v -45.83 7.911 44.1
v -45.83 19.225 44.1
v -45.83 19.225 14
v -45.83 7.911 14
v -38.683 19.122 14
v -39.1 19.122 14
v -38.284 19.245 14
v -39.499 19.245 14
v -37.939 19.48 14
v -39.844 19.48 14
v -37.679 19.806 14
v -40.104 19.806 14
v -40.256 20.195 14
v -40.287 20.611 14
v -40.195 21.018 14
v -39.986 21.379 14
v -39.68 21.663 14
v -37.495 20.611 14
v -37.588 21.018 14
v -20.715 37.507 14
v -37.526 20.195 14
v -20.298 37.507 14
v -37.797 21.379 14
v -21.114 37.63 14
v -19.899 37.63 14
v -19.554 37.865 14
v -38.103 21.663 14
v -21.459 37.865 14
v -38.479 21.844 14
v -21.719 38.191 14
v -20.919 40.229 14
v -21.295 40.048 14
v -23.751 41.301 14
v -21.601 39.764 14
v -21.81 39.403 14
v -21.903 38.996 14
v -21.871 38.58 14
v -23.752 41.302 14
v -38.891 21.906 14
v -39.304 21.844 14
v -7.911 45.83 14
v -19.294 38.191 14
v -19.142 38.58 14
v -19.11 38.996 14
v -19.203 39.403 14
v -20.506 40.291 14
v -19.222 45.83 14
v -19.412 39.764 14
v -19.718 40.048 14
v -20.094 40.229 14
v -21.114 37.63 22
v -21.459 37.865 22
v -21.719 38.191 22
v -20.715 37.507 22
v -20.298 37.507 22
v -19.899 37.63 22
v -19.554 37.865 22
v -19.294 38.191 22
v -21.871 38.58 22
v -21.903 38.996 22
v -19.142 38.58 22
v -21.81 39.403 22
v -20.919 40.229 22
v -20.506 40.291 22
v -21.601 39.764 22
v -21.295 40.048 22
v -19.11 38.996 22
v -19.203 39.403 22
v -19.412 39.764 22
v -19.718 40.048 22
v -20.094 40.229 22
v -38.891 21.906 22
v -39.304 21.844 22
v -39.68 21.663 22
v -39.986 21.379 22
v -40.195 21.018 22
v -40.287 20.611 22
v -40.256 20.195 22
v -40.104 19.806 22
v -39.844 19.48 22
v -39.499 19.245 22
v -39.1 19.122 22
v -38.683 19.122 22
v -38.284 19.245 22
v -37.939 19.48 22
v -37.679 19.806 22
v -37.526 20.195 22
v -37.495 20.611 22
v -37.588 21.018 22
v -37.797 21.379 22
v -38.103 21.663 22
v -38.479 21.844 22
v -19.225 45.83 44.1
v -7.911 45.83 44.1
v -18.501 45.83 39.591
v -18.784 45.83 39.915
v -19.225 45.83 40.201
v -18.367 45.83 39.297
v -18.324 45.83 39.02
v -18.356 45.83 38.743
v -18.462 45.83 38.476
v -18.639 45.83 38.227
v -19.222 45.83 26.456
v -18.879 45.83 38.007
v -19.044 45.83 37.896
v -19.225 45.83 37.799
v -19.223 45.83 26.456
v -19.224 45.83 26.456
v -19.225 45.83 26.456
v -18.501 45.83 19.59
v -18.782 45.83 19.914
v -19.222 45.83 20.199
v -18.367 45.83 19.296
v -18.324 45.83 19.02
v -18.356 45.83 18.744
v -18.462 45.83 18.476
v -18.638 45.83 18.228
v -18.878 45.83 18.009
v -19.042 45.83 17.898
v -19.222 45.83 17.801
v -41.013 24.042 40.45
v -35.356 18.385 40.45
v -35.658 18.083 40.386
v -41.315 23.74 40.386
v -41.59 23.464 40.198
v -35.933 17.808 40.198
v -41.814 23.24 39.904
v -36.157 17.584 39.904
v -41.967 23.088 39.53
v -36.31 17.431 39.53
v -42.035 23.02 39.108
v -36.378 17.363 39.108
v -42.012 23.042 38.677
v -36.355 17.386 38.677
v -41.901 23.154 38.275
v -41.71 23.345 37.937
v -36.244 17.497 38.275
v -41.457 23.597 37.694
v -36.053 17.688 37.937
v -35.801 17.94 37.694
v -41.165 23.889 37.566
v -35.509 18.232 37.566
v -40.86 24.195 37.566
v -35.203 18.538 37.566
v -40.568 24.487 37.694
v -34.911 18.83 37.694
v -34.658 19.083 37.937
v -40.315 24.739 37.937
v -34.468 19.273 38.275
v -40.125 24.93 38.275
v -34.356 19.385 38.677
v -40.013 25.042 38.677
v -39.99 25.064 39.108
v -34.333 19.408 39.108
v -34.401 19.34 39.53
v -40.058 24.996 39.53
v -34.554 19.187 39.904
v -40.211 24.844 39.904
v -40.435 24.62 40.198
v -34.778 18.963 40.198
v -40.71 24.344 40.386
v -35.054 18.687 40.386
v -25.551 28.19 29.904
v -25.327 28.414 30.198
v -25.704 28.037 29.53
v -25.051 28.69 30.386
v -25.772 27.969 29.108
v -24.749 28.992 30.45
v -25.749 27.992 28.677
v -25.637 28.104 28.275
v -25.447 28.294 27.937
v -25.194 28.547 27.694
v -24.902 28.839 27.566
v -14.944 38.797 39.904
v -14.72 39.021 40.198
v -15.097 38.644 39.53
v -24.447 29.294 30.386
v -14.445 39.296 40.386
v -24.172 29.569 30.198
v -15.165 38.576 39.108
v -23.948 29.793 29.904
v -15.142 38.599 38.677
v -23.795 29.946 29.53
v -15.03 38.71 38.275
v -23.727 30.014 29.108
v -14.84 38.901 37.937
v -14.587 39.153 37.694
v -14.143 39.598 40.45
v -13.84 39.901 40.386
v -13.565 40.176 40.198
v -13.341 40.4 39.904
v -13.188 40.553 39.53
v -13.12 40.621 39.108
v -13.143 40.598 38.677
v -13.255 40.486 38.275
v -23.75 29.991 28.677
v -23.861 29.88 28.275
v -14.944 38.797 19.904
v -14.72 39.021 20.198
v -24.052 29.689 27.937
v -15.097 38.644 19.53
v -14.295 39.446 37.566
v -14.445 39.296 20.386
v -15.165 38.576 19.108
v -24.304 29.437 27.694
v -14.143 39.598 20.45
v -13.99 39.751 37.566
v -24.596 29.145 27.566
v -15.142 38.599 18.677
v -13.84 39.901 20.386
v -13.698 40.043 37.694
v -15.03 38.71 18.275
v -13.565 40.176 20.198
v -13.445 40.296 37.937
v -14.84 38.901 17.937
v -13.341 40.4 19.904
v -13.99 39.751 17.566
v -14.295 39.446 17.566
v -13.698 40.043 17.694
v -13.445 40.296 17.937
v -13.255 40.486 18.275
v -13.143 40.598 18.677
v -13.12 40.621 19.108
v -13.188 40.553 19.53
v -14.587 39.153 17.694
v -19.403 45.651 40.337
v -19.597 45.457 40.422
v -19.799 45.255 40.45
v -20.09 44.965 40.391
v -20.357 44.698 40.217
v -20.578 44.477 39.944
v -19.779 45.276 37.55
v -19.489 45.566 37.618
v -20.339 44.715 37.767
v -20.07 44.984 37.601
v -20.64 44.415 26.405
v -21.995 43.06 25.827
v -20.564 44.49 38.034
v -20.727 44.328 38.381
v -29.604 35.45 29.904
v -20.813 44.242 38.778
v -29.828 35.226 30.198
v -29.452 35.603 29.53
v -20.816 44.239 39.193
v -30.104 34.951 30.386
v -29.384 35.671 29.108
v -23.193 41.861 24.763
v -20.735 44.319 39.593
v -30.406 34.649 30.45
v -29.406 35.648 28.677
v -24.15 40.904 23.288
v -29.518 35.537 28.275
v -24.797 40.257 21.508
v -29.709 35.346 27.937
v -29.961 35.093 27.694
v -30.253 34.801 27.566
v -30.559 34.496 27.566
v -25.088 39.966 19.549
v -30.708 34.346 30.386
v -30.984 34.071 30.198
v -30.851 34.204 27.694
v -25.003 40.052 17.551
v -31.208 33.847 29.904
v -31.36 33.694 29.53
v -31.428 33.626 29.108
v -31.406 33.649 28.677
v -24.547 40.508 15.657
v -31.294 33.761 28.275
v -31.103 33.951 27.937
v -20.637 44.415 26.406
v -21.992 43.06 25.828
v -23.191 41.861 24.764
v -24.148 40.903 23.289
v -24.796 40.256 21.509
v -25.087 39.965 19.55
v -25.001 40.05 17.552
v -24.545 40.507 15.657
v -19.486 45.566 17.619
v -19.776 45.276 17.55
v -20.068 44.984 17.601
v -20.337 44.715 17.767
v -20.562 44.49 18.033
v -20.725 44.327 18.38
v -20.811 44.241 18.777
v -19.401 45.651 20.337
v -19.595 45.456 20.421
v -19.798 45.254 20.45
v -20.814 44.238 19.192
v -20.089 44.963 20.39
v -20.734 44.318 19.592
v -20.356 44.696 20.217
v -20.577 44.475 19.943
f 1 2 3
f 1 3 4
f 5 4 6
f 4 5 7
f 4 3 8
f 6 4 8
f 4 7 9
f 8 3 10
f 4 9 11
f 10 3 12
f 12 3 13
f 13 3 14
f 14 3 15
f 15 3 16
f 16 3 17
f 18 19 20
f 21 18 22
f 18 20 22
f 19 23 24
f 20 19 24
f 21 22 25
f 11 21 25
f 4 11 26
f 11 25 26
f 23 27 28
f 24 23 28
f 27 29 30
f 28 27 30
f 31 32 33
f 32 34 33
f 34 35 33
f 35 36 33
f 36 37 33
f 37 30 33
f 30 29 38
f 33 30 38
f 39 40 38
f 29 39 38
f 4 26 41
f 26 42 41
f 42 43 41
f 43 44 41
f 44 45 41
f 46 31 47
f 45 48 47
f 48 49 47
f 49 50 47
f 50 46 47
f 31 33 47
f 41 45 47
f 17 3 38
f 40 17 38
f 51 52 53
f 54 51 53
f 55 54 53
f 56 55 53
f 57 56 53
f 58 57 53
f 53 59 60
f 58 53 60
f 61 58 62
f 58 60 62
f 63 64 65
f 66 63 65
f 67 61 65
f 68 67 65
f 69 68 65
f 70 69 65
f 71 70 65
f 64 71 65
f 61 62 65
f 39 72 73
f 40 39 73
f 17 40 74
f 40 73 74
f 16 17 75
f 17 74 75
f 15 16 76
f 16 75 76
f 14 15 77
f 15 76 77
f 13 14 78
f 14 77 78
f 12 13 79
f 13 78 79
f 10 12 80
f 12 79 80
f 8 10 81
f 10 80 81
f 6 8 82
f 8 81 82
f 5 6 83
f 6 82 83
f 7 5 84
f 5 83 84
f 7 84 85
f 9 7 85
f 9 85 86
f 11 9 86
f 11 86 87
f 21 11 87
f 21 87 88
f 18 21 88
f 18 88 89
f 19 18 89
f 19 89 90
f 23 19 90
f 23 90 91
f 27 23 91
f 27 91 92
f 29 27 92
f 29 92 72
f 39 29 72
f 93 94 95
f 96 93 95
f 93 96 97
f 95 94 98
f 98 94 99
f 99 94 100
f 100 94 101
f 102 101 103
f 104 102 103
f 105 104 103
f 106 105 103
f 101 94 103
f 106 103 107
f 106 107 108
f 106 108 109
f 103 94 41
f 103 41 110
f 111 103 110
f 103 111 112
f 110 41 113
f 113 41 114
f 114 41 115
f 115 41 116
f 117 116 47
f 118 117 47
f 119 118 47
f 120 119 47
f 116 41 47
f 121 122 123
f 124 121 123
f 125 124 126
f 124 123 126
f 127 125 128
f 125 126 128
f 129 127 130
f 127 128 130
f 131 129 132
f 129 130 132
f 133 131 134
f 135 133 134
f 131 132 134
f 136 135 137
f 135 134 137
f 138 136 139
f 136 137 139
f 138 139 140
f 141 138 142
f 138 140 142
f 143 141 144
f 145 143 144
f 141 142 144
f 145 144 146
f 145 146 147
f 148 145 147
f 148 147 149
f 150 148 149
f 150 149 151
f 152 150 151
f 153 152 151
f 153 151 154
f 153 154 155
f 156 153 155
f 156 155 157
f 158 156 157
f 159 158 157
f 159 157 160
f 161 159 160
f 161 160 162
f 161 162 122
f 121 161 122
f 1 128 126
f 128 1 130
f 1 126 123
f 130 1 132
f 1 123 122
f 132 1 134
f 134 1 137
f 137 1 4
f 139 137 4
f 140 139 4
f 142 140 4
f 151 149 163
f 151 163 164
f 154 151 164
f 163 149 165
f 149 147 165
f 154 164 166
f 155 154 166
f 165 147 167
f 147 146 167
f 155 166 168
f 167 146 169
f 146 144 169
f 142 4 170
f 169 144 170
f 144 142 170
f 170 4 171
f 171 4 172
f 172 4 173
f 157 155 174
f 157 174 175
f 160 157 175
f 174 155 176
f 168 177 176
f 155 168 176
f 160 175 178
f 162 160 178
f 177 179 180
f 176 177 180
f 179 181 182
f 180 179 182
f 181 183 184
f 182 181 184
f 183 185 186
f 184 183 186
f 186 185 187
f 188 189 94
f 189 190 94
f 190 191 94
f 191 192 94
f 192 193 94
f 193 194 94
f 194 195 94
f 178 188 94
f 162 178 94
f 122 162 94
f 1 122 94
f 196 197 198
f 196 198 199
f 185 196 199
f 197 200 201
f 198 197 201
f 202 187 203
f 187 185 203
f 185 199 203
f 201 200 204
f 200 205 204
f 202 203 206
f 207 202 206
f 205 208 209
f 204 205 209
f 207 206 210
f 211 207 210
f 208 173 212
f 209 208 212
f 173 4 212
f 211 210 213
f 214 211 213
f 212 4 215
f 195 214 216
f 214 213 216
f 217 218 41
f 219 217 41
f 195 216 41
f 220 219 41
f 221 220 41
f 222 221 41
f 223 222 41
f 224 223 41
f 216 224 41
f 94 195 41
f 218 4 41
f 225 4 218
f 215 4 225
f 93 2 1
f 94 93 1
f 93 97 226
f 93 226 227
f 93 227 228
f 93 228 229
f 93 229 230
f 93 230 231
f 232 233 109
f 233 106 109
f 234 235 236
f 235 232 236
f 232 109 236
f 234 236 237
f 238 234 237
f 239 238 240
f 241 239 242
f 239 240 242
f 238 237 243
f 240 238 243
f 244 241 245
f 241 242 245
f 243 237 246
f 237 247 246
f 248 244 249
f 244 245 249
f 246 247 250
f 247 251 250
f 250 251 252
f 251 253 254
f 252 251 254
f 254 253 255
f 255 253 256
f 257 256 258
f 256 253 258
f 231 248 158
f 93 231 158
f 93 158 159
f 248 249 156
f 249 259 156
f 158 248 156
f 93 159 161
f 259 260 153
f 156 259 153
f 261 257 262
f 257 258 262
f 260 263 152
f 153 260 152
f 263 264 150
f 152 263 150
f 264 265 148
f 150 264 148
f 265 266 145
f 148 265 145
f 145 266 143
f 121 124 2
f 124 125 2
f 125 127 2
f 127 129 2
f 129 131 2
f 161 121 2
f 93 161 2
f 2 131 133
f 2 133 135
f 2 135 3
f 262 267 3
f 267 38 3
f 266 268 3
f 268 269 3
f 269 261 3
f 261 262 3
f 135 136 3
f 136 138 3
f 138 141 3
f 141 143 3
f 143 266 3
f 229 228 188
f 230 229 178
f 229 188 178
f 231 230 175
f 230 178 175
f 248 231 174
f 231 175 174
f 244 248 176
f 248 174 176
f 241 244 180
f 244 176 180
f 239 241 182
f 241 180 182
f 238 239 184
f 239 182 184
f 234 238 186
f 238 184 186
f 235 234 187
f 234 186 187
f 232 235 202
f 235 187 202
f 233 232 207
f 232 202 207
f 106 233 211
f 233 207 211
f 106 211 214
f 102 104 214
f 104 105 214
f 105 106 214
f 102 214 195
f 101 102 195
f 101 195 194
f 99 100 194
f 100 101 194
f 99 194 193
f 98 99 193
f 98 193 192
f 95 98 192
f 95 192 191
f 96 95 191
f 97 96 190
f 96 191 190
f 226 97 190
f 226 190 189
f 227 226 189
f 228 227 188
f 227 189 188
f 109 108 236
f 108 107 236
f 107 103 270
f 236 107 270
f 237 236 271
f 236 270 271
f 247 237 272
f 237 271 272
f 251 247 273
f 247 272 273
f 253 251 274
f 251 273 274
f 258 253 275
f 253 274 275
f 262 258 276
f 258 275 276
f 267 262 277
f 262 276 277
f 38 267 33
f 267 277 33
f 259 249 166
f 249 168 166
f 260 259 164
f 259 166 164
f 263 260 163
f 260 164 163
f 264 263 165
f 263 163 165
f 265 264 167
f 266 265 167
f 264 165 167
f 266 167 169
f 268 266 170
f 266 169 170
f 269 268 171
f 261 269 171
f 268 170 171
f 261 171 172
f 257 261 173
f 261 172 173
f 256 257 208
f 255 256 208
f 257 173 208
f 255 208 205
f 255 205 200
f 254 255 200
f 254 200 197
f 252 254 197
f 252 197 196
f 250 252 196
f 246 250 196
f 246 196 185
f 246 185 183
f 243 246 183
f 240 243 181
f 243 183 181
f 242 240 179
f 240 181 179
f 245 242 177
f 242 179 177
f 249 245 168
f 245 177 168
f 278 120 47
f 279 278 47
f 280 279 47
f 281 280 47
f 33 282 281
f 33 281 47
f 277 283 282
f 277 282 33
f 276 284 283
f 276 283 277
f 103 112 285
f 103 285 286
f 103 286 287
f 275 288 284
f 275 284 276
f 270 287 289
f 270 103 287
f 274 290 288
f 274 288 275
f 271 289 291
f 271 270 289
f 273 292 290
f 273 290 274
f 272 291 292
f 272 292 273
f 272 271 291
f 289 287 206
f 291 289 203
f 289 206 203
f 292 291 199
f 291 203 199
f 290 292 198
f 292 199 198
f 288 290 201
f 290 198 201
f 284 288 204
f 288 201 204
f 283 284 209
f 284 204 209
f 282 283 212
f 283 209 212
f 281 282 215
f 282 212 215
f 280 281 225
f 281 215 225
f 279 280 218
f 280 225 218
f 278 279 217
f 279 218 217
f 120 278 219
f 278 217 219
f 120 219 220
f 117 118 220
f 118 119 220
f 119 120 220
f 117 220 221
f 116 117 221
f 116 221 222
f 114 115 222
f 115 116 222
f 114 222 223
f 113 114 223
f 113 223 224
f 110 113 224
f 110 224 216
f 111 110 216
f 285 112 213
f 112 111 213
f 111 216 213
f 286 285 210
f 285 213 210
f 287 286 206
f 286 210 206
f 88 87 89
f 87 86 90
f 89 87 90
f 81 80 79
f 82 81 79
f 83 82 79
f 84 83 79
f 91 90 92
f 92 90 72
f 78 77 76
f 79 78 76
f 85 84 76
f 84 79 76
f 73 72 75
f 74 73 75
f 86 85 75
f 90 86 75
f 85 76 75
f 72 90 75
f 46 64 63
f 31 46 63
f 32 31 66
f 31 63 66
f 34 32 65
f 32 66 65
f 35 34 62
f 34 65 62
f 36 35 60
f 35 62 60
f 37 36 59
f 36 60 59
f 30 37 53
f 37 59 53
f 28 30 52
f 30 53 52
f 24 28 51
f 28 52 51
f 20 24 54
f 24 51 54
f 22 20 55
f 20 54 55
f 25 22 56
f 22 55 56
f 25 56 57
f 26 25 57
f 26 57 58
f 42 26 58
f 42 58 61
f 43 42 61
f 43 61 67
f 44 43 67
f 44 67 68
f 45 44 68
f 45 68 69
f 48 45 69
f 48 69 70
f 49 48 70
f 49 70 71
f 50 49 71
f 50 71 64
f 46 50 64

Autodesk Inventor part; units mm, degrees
ref_plane "YZ Plane" through (0, 0, 0) normal (1, 0, 0) x (0, 1, 0)
ref_plane "Work Plane1" through (0, 0, 10) normal (0, 0, 1) x (1, 0, 0)
sketch "Sketch1" plane through (0, 0, 10) normal (0, 0, 1) x (1, 0, 0)
  line L0 (-4.0299, -0.3538) -> (-2.2322, 1.4439) construction
  arc A0 (-1.4439, 2.2322) -> (-2.2322, 1.4439) centre (-0.9299, 0.9299) ccw construction
  line L1 (-1.4439, 2.2322) -> (0.3538, 4.0299) construction
  line L2 (-37.8299, 42.8299) -> (-37.8299, 37.8299) construction
  line L3 (-37.8299, 37.8299) -> (-42.9208, 37.8299) construction
  line L4 (-37.8299, 42.2137) -> (-37.8299, 45.8299) construction
  line L5 (-37.8299, 45.8299) -> (-4.0299, 45.8299) construction
  line L6 (-4.0299, 45.8299) -> (-4.0299, 42.2137) construction
  line L7 (-4.0299, 4.0299) -> (0.3538, 4.0299) projected
  circle A1 centre (-20.9299, 20.9299) radius 17.5 projected
  line L8 (-20.9299, 58.9723) -> (17.1124, 20.9299) construction
  line L9 (17.1124, 20.9299) -> (-20.9299, -17.1124) construction
  line L10 (-20.9299, -17.1124) -> (-58.9723, 20.9299) construction
  line L11 (-58.9723, 20.9299) -> (-20.9299, 58.9723) construction
  line L12 (-20.9299, 58.9723) -> (-20.9299, -17.1124) construction
  line L13 (17.1124, 20.9299) -> (-58.9723, 20.9299) construction
  line L14 (-20.9299, 58.9723) -> (32.8701, 58.9723) construction
  line L15 (-43.4299, 43.4299) -> (1.5701, 43.4299) construction
  line L16 (1.5701, 43.4299) -> (1.5701, -1.5701) construction
  line L17 (1.5701, -1.5701) -> (-43.4299, -1.5701) construction
  line L18 (-43.4299, -1.5701) -> (-43.4299, 43.4299) construction
  line L19 (-43.4299, 43.4299) -> (1.5701, -1.5701) construction
  line L20 (1.5701, 43.4299) -> (-43.4299, -1.5701) construction
  line L21 (-43.4299, 5.3876) -> (-43.4299, 36.4723)
  line L22 (-43.4299, 36.4723) -> (-36.4723, 43.4299)
  line L23 (-36.4723, 43.4299) -> (-5.3876, 43.4299)
  line L24 (-5.3876, 43.4299) -> (1.5701, 36.4723)
  line L25 (1.5701, 36.4723) -> (1.5701, 5.3876)
  line L26 (1.5701, 5.3876) -> (-5.3876, -1.5701)
  line L27 (-5.3876, -1.5701) -> (-36.4723, -1.5701)
  line L28 (-36.4723, -1.5701) -> (-43.4299, 5.3876)
  line L29 (-4.0299, 42.2137) -> (-37.8299, 42.2137) projected
  line L30 (-4.0299, -0.3538) -> (-4.0299, 4.0299) projected
  circle A2 centre (-20.9299, 20.9299) radius 1.4
  line L31 (-10.9299, 10.9299) -> (-30.9299, 10.9299) construction
  line L32 (-30.9299, 10.9299) -> (-30.9299, 30.9299) construction
  line L33 (-30.9299, 30.9299) -> (-10.9299, 30.9299) construction
  line L34 (-10.9299, 30.9299) -> (-10.9299, 10.9299) construction
  line L35 (-10.9299, 10.9299) -> (-30.9299, 30.9299) construction
  line L36 (-30.9299, 10.9299) -> (-10.9299, 30.9299) construction
  circle A3 centre (-30.9299, 30.9299) radius 1.4
  circle A4 centre (-30.9299, 10.9299) radius 1.4
  circle A5 centre (-10.9299, 10.9299) radius 1.4
  line L37 (-45.8299, 37.8299) -> (-42.0723, 37.8299) construction
  line L38 (-42.1723, 37.7299) -> (-45.8299, 37.7299)
  line L39 (-45.8299, 37.7299) -> (-45.8299, 4.1299)
  line L40 (-45.8299, 4.1299) -> (-42.1723, 4.1299)
  line L41 (-42.1723, 4.1299) -> (-42.1723, 37.7299)
  line L42 (-45.8299, 4.0299) -> (-42.0723, 4.0299) construction
  line L43 (-45.8299, 37.8299) -> (-42.0723, 37.8299) projected
  line L44 (-37.7299, 45.8299) -> (-4.1299, 45.8299)
  line L45 (-4.1299, 45.8299) -> (-4.1299, 42.1723)
  line L46 (-4.1299, 42.1723) -> (-37.7299, 42.1723)
  line L47 (-37.7299, 42.1723) -> (-37.7299, 45.8299)
  line L48 (0.4701, 37.8299) -> (0.4701, 4.0299) construction
  line L49 (0.4701, 4.0299) -> (3.9701, 4.0299) construction
  line L50 (3.9701, 37.8299) -> (3.9701, 4.0299) construction
  line L51 (0.4701, 37.8299) -> (3.9701, 37.8299) construction
  line L52 (-45.8299, -3.9701) -> (-4.0299, -3.9701) construction
  line L53 (0.3124, 37.7299) -> (3.9701, 37.7299)
  line L54 (3.9701, 37.7299) -> (3.9701, 4.1299)
  line L55 (3.9701, 4.1299) -> (0.3124, 4.1299)
  line L56 (0.3124, 4.1299) -> (0.3124, 37.7299)
  line L57 (-4.1713, -0.3538) -> (-37.7299, -0.3538)
  line L58 (-37.7299, -0.3538) -> (-37.7299, -3.9701)
  line L59 (-37.7299, -3.9701) -> (-4.1713, -3.9701)
  line L60 (-4.1713, -3.9701) -> (-4.1713, -0.3538)
  point P0 (-37.8299, 4.0299)
  dimension "d18" = 53.8
  dimension "d19" = 45
  dimension "d20" = 53.8
  dimension "d21" = 45
  dimension "d22" = 45
  dimension "d30" = 20
  dimension "d31" = 20
  dimension "d32" = 2.8
  dimension "d33" = 2.8
  dimension "d34" = 2.8
  dimension "d35" = 2.8
  dimension "d36" = 0.1
  dimension "d37" = 0.1
  dimension "d38" = 0.1
  dimension "d39" = 0.1
extrude "Extrusion1" add sketch "Sketch1" along normal blind 5 contours L30 L26 L57 L28 L41 L22 L46 L24 L56 L7 | L7 L26 L30 | L56 L24 L25 L26 | L26 L25 L24 L53 L54 L55 | L60 L59 L58 L57 L28 L27 L26 | L26 L27 L28 L57 | L46 L22 L29 L24 | L24 L29 L45 | L40 L39 L38 L22 L21 L28 | L28 L21 L22 L41 | L29 L22 L23 L24 | L24 L23 L22 L29 L47 L44 L45 | L47 L29 L22 | A1 | A2 | A3 | A4 | A5
sketch "Sketch4" plane through (0, 0, 15) normal (0, 0, 1) x (1, 0, 0)
  line L0 (-37.7299, 42.1723) -> (-42.1723, 37.7299) projected
  line L1 (-42.1723, 37.7299) -> (-45.8299, 37.7299) projected
  line L2 (-45.8299, 37.7299) -> (-45.8299, 4.1299) projected
  line L3 (-45.8299, 4.1299) -> (-42.1723, 4.1299) projected
  line L4 (-42.1723, 4.1299) -> (-37.6885, -0.3538) projected
  line L5 (-37.6885, -0.3538) -> (-37.7299, -0.3538) projected
  line L6 (-37.7299, -0.3538) -> (-37.7299, -3.9701) projected
  line L7 (-37.7299, -3.9701) -> (-4.1713, -3.9701) projected
  line L8 (-4.1713, -3.9701) -> (-4.1713, -0.3538) projected
  line L9 (-4.1713, -0.3538) -> (0.3124, 4.1299) projected
  line L10 (0.3124, 4.1299) -> (3.9701, 4.1299) projected
  line L11 (3.9701, 4.1299) -> (3.9701, 37.7299) projected
  line L12 (3.9701, 37.7299) -> (0.3124, 37.7299) projected
  line L13 (0.3124, 37.7299) -> (-4.1299, 42.1723) projected
  line L14 (-4.1299, 42.1723) -> (-4.1299, 45.8299) projected
  line L15 (-4.1299, 45.8299) -> (-37.7299, 45.8299) projected
  line L16 (-37.7299, 45.8299) -> (-37.7299, 42.1723) projected
  line L17 (-45.8299, 37.7299) -> (-45.8299, 4.1299) projected
  line L18 (-45.8299, 7.911) -> (-7.911, 45.8299)
  line L19 (-45.8299, 7.911) -> (7.7955, 7.911) construction
  line L20 (-7.911, 45.8299) -> (-19.2247, 45.8299)
  line L21 (-4.1299, 45.8299) -> (-37.7299, 45.8299) projected
  line L22 (-19.2247, 45.8299) -> (-45.8299, 19.2247)
  line L23 (-45.8299, 7.911) -> (-45.8299, 19.2247)
  circle A0 centre (-40.9299, 0.9299) radius 1.1933 projected
  circle A1 centre (-0.9299, 40.9299) radius 1.4 projected
  line L24 (-40.9299, 0.9299) -> (-0.9299, 40.9299)
  line L25 (0.3124, 37.7299) -> (-4.1299, 42.1723) projected
  point P0 (0, 0)
  dimension "d40" = 45
  dimension "d41" = 8
extrude "Extrusion4" add sketch "Sketch4" along normal blind 28 contours L15 L18 L2 L22
sketch "Sketch5" plane through (-45.8299, 19.2247, 15) normal (-0.7071068, 0.7071068, 0) x (-0.7071068, -0.7071068, 0)
  line L0 (0, 0) -> (-37.6254, 0) projected
  line L1 (0, 0) -> (0, 28) projected
  line L2 (-37.6254, 28) -> (0, 28) projected
  line L3 (-37.6254, 0) -> (-37.6254, 28) projected
  circle A0 centre (-18.8127, 9.1873) radius 18.8127
  line L4 (-6.8127, 24) -> (-36.8127, 24) construction
  line L5 (-36.8127, 24) -> (-36.8127, 4) construction
  line L6 (-36.8127, 4) -> (-6.8127, 4) construction
  line L7 (-6.8127, 4) -> (-6.8127, 24) construction
  line L8 (-6.8127, 24) -> (-36.8127, 4) construction
  line L9 (-36.8127, 24) -> (-6.8127, 4) construction
  point P0 (-18.8127, -15)
  point P1 (-21.8127, 14)
  dimension "d44" = 30
  dimension "d45" = 20
hole "Hole1" at (-19.7994, 45.2552, 39) at (-19.7994, 45.2552, 19) at (-41.0126, 24.042, 39) at (-30.406, 34.6486, 29) direction (0.7071068, -0.7071068, 0) diameter 2.9 depth 12
sketch "Sketch6" plane through (-37.7299, -3.9701, 10) normal (0, -1, 0) x (1, 0, 0)
  circle A0 centre (-3.2, 36.9) radius 1.45 projected
  circle A1 centre (36.8, 36.9) radius 1.45 projected
  line L0 (-6.1, 0) -> (-6.1, 39.8) projected
  line L1 (-0.1, 0) -> (-6.1, 0) projected
  line L2 (-0.1, 33.8) -> (-0.1, 0) projected
  line L3 (33.7, 33.8) -> (-0.1, 33.8) projected
  line L4 (33.7, 33.8) -> (33.7, 0) projected
  line L5 (39.7, 0) -> (33.7, 0) projected
  line L6 (39.7, 39.8) -> (39.7, 0) projected
  line L7 (-6.1, 39.8) -> (39.7, 39.8) projected
  circle A2 centre (16.8, 16.9) radius 16.9
  circle A3 centre (16.8, 16.9) radius 14.9
  line L8 (-0.1, 16.9) -> (-0.1, 0)
  line L9 (0, 0) -> (33.5586, 0) projected
  line L10 (0.0414, 0) -> (-4.4423, 0) projected
  line L11 (33.5586, 0) -> (0.0414, 0)
  line L12 (33.7, 16.9) -> (33.5586, 0)
  point P0 (37.7299, -10)
  dimension "d53" = 2
extrude "Extrusion5" cut sketch "Sketch6" against normal up to surface contours A3 surface through (-45.8299, 7.911, 15) normal (0.7071068, -0.7071068, 0)
ref_plane "Work Plane3" through (3.9701, 45.8299, 26) normal (1, 0, 0) x (0, -1, 0)
sketch "Sketch7" plane through (3.9701, 45.8299, 26) normal (1, 0, 0) x (0, -1, 0)
  line L0 (41.8, -17.8) -> (41.8, 16) projected
  line L1 (8, -17.8) -> (41.8, -17.8) projected
  line L2 (8, -17.8) -> (8, 16) projected
  circle A0 centre (24.9, -0.9) radius 16.9
  circle A1 centre (24.9, -0.9) radius 14.9
  point P0 (45.8299, 26)
  dimension "d56" = 2
ref_plane "Work Plane4" through (-34.8055, 8.3289, 16.6138) normal (0.7071068, -0.7071068, 0) x (0.7071068, 0.7071068, 0)
extrude "Extrusion6" cut sketch "Sketch7" against normal up to surface contours A1 surface through (-45.8299, 7.911, 15) normal (0.7071068, -0.7071068, 0)
sketch "Sketch8" plane through (-45.8299, 19.2247, 15) normal (-0.7071068, 0.7071068, 0) x (-0.7071068, -0.7071068, 0)
  arc A0 (-37.6254, 2.7992) -> (-37.6254, 5.2008) centre (-36.8127, 4) ccw projected
  circle A1 centre (-36.8127, 4) radius 7.5
  point P0 (-18.8127, -15)
  dimension "d59" = 15
extrude "Extrusion7" cut sketch "Sketch8" along normal blind 10
sketch "Sketch9" plane through (0, 0, 10) normal (0, 0, -1) x (-1, 0, 0)
  line L0 (45.8299, 19.2247) -> (24.2855, 40.7692) projected
  line L1 (41.7776, 11.9633) -> (26.8705, 26.8705) projected
  line L2 (26.8705, 26.8705) -> (11.9633, 41.7776) projected
  line L3 (19.2247, 45.8299) -> (24.2855, 40.7692) projected
  line L4 (7.911, 45.8299) -> (11.9633, 41.7776) projected
  line L5 (41.7776, 11.9633) -> (45.8299, 7.911) projected
  line L6 (15.1679, 38.5731) -> (20.8247, 44.2299) projected
  line L7 (13.1172, 40.6237) -> (18.3235, 45.8299) projected
  line L8 (34.3304, 19.4105) -> (39.9873, 25.0673) projected
  line L9 (36.3811, 17.3599) -> (42.0379, 23.0167) projected
  circle A0 centre (20.5065, 38.8913) radius 1.4
  line L10 (25.7745, 27.9665) -> (31.4313, 33.6233) projected
  line L11 (31.4313, 33.6233) -> (25.7745, 27.9665)
  line L12 (26.8705, 26.8705) -> (32.5273, 32.5273)
  circle A1 centre (38.8913, 20.5065) radius 1.4
  point P0 (0, 0)
  point P1 (34.7528, 24.7491)
  dimension "d62" = 2.8
hole "Hole2" at (-20.5065, 38.8913, 10) at (-38.8913, 20.5065, 10) direction (0, 0, 1) diameter 2.8 depth 12 counterbore diameter 5.5 counterbore depth 3
sketch "Sketch11" plane through (0, 0, 43) normal (0, 0, 1) x (1, 0, 0)
  line L0 (-7.911, 45.8299) -> (-19.2247, 45.8299) projected
  line L1 (-19.2247, 45.8299) -> (-45.8299, 19.2247) projected
  line L2 (-45.8299, 19.2247) -> (-45.8299, 7.911) projected
  line L3 (-45.8299, 7.911) -> (-7.911, 45.8299) projected
  line L4 (-45.8299, 37.7299) -> (-45.8299, 19.2247) projected
  line L5 (-42.1723, 37.7299) -> (-45.8299, 37.7299) projected
  line L6 (-37.7299, 42.1723) -> (-42.1723, 37.7299) projected
  line L7 (-37.7299, 45.8299) -> (-37.7299, 42.1723) projected
  line L8 (-29.3463, 45.8299) -> (-37.7299, 45.8299) projected
  line L9 (-29.3463, 45.8299) -> (-19.2247, 45.8299) projected
  line L10 (-4.1299, 45.8299) -> (-7.911, 45.8299) projected
  line L11 (-4.1299, 42.1723) -> (-4.1299, 45.8299) projected
  line L12 (0.3124, 37.7299) -> (-4.1299, 42.1723) projected
  line L13 (3.9701, 37.7299) -> (0.3124, 37.7299) projected
  line L14 (3.9701, 29.8965) -> (3.9701, 11.9633) projected
  line L15 (3.9701, 29.8965) -> (3.9701, 37.7299) projected
  line L16 (-11.9633, -3.9701) -> (-4.1713, -3.9701) projected
  line L17 (-4.1713, -3.9701) -> (-4.1713, -0.3538) projected
  line L18 (-4.1713, -0.3538) -> (0.3124, 4.1299) projected
  line L19 (0.3124, 4.1299) -> (3.9701, 4.1299) projected
  line L20 (3.9701, 4.1299) -> (3.9701, 11.9633) projected
  line L21 (-11.9633, -3.9701) -> (-29.8965, -3.9701) projected
  line L22 (-37.7299, -3.9701) -> (-29.8965, -3.9701) projected
  line L23 (-37.7299, -0.3538) -> (-37.7299, -3.9701) projected
  line L24 (-45.8299, 7.911) -> (-7.911, 45.8299) projected
  line L25 (-45.8299, 7.911) -> (-7.911, 45.8299)
  line L26 (-45.8299, 7.911) -> (-45.8299, 4.1299) projected
  line L27 (-45.8299, 4.1299) -> (-42.1723, 4.1299) projected
  line L28 (-37.6885, -0.3538) -> (-37.7299, -0.3538) projected
  line L29 (-42.1723, 4.1299) -> (-37.6885, -0.3538) projected
  point P0 (0, 0)
extrude "Extrusion8" cut sketch "Sketch11" against normal through all contours L10 L11 L12 L13 L15 L14 L20 L19 L18 L17 L16 L21 L22 L23 L28 L29 L27 L26 L3 | L1 L4 L5 L6 L7 L8 L9
sketch "Sketch12" plane through (-45.8299, 19.2247, 10) normal (-0.7071068, 0.7071068, 0) x (-0.7071068, -0.7071068, 0)
  line L0 (-45.6254, 33) -> (-45.6254, 0) projected
  line L1 (8, 0) -> (8, 33) projected
  line L2 (-45.6254, 0) -> (8, 0)
  line L3 (8, 0) -> (8, 4)
  line L4 (8, 4) -> (-45.6254, 4)
  line L5 (-45.6254, 4) -> (-45.6254, 0)
  point P0 (-18.8127, -10)
  point P1 (45.6254, -4)
  point P2 (45.6254, -5)
  point P3 (-8, -5)
  point P4 (-8, -4)
  dimension "d73" = 4
extrude "Extrusion9" cut sketch "Sketch12" against normal blind 29
sketch "Sketch13" plane through (0, 0, 43) normal (0, 0, 1) x (1, 0, 0)
  line L0 (-7.911, 45.8299) -> (-19.2247, 45.8299) projected
  line L1 (-19.2247, 45.8299) -> (-45.8299, 19.2247) projected
  line L2 (-45.8299, 19.2247) -> (-45.8299, 7.911) projected
  line L3 (-45.8299, 7.911) -> (-7.911, 45.8299) projected
  point P0 (0, 0)
ref_plane "Work Plane5" through (-45.7299, 3.9099, 44.1) normal (0, 0, -1) x (0, 1, 0)
extrude "Extrusion10" add sketch "Sketch13" along normal up to surface (1.1 mm away)
properties part number "20_Cube_Insert_Kinematic_Mirrormount_45_base_part2"
